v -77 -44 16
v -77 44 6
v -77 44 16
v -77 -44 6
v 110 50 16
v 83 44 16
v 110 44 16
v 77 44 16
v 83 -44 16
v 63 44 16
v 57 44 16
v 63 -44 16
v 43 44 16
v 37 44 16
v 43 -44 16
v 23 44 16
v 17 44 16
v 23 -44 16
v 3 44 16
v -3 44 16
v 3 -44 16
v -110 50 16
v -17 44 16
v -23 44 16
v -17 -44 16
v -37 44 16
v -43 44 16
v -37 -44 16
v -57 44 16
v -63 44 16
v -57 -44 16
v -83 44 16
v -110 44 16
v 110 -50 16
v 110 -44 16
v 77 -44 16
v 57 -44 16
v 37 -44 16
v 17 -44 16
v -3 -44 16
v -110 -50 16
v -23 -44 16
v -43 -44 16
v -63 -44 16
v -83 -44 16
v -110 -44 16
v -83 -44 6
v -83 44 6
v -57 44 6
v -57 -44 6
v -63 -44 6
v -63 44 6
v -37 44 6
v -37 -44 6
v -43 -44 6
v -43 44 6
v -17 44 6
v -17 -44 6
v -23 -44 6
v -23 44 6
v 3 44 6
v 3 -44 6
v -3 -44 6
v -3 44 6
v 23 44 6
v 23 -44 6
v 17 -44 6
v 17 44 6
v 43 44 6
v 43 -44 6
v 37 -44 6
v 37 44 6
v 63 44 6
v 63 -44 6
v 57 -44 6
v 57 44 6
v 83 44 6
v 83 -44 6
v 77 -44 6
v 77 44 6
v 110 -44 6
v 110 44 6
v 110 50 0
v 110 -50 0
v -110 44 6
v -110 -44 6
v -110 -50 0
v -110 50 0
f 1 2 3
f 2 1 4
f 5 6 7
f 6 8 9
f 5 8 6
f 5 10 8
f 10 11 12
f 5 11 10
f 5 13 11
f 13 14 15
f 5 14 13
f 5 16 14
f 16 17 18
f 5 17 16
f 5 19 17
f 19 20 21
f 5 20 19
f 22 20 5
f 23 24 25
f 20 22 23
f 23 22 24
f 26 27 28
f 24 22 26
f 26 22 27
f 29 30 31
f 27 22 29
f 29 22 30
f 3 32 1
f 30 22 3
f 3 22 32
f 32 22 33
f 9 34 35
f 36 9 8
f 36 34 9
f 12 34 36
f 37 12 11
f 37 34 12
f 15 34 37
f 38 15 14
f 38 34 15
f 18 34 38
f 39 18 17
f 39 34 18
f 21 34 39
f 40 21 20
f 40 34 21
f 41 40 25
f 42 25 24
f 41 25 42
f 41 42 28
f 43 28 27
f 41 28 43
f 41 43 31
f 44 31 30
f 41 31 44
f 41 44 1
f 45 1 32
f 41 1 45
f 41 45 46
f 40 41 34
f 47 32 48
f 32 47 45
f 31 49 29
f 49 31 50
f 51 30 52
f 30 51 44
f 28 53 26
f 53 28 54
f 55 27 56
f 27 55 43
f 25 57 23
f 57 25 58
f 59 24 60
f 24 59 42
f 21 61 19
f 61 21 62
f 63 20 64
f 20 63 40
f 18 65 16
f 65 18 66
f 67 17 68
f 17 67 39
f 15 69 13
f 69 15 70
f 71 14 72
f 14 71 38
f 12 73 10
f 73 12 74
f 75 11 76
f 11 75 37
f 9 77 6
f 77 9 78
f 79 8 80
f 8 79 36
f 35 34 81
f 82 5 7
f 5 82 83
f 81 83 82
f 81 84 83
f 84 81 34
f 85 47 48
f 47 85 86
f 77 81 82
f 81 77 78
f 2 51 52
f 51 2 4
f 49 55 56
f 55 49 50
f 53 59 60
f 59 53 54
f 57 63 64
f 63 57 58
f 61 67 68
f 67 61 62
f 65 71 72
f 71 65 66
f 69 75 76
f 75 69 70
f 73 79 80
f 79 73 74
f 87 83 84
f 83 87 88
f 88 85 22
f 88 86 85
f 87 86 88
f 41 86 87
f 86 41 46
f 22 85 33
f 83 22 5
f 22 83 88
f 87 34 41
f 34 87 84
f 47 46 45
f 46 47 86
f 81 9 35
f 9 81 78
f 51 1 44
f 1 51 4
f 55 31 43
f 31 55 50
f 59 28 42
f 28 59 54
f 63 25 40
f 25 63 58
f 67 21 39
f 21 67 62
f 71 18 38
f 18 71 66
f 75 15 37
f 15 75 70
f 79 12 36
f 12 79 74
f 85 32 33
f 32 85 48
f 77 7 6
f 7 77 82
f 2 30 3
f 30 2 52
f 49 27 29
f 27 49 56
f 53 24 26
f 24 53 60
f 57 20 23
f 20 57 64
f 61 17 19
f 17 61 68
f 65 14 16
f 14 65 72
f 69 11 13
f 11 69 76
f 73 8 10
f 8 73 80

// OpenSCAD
$fn = 32;
// ----------------------------------------------------------------------
// Rib frame 220 x 100 x 16
// 9 ribs at 20 mm pitch
// ----------------------------------------------------------------------

// --- parameters (mm) ---
frame = [220, 100, 6];  // base plate size (x, y, z)
rail_w = 6;             // side rail width
ribs = 9;               // number of ribs
rib_t = 6;              // rib thickness
rib_h = 10;             // rib height above the base plate
pitch = 20;             // pitch between rib centres

// --- derived feature positions (mm) ---
span = (ribs - 1) * pitch;          // = 160   distance between the outer ribs
origin_x = -span / 2;               // = -80   X of the first rib
rib_len = frame[1] - 2 * rail_w + 2;  // = 90   rib length, 1 mm into each rail
feature_centers = [
  [origin_x + 0 * pitch, 0],
  [origin_x + 1 * pitch, 0],
  [origin_x + 2 * pitch, 0],
  [origin_x + 3 * pitch, 0],
  [origin_x + 4 * pitch, 0],
  [origin_x + 5 * pitch, 0],
  [origin_x + 6 * pitch, 0],
  [origin_x + 7 * pitch, 0],
  [origin_x + 8 * pitch, 0]
];   // rib centre line, drives the rib loop

// base plate, two side rails, then the ribs read straight off feature_centers
union() {
  translate([-frame[0] / 2, -frame[1] / 2, 0]) cube(frame);
  translate([-frame[0] / 2, -frame[1] / 2, 0]) cube([frame[0], rail_w, frame[2] + rib_h]);
  translate([-frame[0] / 2, frame[1] / 2 - rail_w, 0]) cube([frame[0], rail_w, frame[2] + rib_h]);
  for (centre = feature_centers)
    translate([centre[0] - rib_t / 2, centre[1] - rib_len / 2, frame[2] - 1])
      cube([rib_t, rib_len, rib_h + 1]);
}
